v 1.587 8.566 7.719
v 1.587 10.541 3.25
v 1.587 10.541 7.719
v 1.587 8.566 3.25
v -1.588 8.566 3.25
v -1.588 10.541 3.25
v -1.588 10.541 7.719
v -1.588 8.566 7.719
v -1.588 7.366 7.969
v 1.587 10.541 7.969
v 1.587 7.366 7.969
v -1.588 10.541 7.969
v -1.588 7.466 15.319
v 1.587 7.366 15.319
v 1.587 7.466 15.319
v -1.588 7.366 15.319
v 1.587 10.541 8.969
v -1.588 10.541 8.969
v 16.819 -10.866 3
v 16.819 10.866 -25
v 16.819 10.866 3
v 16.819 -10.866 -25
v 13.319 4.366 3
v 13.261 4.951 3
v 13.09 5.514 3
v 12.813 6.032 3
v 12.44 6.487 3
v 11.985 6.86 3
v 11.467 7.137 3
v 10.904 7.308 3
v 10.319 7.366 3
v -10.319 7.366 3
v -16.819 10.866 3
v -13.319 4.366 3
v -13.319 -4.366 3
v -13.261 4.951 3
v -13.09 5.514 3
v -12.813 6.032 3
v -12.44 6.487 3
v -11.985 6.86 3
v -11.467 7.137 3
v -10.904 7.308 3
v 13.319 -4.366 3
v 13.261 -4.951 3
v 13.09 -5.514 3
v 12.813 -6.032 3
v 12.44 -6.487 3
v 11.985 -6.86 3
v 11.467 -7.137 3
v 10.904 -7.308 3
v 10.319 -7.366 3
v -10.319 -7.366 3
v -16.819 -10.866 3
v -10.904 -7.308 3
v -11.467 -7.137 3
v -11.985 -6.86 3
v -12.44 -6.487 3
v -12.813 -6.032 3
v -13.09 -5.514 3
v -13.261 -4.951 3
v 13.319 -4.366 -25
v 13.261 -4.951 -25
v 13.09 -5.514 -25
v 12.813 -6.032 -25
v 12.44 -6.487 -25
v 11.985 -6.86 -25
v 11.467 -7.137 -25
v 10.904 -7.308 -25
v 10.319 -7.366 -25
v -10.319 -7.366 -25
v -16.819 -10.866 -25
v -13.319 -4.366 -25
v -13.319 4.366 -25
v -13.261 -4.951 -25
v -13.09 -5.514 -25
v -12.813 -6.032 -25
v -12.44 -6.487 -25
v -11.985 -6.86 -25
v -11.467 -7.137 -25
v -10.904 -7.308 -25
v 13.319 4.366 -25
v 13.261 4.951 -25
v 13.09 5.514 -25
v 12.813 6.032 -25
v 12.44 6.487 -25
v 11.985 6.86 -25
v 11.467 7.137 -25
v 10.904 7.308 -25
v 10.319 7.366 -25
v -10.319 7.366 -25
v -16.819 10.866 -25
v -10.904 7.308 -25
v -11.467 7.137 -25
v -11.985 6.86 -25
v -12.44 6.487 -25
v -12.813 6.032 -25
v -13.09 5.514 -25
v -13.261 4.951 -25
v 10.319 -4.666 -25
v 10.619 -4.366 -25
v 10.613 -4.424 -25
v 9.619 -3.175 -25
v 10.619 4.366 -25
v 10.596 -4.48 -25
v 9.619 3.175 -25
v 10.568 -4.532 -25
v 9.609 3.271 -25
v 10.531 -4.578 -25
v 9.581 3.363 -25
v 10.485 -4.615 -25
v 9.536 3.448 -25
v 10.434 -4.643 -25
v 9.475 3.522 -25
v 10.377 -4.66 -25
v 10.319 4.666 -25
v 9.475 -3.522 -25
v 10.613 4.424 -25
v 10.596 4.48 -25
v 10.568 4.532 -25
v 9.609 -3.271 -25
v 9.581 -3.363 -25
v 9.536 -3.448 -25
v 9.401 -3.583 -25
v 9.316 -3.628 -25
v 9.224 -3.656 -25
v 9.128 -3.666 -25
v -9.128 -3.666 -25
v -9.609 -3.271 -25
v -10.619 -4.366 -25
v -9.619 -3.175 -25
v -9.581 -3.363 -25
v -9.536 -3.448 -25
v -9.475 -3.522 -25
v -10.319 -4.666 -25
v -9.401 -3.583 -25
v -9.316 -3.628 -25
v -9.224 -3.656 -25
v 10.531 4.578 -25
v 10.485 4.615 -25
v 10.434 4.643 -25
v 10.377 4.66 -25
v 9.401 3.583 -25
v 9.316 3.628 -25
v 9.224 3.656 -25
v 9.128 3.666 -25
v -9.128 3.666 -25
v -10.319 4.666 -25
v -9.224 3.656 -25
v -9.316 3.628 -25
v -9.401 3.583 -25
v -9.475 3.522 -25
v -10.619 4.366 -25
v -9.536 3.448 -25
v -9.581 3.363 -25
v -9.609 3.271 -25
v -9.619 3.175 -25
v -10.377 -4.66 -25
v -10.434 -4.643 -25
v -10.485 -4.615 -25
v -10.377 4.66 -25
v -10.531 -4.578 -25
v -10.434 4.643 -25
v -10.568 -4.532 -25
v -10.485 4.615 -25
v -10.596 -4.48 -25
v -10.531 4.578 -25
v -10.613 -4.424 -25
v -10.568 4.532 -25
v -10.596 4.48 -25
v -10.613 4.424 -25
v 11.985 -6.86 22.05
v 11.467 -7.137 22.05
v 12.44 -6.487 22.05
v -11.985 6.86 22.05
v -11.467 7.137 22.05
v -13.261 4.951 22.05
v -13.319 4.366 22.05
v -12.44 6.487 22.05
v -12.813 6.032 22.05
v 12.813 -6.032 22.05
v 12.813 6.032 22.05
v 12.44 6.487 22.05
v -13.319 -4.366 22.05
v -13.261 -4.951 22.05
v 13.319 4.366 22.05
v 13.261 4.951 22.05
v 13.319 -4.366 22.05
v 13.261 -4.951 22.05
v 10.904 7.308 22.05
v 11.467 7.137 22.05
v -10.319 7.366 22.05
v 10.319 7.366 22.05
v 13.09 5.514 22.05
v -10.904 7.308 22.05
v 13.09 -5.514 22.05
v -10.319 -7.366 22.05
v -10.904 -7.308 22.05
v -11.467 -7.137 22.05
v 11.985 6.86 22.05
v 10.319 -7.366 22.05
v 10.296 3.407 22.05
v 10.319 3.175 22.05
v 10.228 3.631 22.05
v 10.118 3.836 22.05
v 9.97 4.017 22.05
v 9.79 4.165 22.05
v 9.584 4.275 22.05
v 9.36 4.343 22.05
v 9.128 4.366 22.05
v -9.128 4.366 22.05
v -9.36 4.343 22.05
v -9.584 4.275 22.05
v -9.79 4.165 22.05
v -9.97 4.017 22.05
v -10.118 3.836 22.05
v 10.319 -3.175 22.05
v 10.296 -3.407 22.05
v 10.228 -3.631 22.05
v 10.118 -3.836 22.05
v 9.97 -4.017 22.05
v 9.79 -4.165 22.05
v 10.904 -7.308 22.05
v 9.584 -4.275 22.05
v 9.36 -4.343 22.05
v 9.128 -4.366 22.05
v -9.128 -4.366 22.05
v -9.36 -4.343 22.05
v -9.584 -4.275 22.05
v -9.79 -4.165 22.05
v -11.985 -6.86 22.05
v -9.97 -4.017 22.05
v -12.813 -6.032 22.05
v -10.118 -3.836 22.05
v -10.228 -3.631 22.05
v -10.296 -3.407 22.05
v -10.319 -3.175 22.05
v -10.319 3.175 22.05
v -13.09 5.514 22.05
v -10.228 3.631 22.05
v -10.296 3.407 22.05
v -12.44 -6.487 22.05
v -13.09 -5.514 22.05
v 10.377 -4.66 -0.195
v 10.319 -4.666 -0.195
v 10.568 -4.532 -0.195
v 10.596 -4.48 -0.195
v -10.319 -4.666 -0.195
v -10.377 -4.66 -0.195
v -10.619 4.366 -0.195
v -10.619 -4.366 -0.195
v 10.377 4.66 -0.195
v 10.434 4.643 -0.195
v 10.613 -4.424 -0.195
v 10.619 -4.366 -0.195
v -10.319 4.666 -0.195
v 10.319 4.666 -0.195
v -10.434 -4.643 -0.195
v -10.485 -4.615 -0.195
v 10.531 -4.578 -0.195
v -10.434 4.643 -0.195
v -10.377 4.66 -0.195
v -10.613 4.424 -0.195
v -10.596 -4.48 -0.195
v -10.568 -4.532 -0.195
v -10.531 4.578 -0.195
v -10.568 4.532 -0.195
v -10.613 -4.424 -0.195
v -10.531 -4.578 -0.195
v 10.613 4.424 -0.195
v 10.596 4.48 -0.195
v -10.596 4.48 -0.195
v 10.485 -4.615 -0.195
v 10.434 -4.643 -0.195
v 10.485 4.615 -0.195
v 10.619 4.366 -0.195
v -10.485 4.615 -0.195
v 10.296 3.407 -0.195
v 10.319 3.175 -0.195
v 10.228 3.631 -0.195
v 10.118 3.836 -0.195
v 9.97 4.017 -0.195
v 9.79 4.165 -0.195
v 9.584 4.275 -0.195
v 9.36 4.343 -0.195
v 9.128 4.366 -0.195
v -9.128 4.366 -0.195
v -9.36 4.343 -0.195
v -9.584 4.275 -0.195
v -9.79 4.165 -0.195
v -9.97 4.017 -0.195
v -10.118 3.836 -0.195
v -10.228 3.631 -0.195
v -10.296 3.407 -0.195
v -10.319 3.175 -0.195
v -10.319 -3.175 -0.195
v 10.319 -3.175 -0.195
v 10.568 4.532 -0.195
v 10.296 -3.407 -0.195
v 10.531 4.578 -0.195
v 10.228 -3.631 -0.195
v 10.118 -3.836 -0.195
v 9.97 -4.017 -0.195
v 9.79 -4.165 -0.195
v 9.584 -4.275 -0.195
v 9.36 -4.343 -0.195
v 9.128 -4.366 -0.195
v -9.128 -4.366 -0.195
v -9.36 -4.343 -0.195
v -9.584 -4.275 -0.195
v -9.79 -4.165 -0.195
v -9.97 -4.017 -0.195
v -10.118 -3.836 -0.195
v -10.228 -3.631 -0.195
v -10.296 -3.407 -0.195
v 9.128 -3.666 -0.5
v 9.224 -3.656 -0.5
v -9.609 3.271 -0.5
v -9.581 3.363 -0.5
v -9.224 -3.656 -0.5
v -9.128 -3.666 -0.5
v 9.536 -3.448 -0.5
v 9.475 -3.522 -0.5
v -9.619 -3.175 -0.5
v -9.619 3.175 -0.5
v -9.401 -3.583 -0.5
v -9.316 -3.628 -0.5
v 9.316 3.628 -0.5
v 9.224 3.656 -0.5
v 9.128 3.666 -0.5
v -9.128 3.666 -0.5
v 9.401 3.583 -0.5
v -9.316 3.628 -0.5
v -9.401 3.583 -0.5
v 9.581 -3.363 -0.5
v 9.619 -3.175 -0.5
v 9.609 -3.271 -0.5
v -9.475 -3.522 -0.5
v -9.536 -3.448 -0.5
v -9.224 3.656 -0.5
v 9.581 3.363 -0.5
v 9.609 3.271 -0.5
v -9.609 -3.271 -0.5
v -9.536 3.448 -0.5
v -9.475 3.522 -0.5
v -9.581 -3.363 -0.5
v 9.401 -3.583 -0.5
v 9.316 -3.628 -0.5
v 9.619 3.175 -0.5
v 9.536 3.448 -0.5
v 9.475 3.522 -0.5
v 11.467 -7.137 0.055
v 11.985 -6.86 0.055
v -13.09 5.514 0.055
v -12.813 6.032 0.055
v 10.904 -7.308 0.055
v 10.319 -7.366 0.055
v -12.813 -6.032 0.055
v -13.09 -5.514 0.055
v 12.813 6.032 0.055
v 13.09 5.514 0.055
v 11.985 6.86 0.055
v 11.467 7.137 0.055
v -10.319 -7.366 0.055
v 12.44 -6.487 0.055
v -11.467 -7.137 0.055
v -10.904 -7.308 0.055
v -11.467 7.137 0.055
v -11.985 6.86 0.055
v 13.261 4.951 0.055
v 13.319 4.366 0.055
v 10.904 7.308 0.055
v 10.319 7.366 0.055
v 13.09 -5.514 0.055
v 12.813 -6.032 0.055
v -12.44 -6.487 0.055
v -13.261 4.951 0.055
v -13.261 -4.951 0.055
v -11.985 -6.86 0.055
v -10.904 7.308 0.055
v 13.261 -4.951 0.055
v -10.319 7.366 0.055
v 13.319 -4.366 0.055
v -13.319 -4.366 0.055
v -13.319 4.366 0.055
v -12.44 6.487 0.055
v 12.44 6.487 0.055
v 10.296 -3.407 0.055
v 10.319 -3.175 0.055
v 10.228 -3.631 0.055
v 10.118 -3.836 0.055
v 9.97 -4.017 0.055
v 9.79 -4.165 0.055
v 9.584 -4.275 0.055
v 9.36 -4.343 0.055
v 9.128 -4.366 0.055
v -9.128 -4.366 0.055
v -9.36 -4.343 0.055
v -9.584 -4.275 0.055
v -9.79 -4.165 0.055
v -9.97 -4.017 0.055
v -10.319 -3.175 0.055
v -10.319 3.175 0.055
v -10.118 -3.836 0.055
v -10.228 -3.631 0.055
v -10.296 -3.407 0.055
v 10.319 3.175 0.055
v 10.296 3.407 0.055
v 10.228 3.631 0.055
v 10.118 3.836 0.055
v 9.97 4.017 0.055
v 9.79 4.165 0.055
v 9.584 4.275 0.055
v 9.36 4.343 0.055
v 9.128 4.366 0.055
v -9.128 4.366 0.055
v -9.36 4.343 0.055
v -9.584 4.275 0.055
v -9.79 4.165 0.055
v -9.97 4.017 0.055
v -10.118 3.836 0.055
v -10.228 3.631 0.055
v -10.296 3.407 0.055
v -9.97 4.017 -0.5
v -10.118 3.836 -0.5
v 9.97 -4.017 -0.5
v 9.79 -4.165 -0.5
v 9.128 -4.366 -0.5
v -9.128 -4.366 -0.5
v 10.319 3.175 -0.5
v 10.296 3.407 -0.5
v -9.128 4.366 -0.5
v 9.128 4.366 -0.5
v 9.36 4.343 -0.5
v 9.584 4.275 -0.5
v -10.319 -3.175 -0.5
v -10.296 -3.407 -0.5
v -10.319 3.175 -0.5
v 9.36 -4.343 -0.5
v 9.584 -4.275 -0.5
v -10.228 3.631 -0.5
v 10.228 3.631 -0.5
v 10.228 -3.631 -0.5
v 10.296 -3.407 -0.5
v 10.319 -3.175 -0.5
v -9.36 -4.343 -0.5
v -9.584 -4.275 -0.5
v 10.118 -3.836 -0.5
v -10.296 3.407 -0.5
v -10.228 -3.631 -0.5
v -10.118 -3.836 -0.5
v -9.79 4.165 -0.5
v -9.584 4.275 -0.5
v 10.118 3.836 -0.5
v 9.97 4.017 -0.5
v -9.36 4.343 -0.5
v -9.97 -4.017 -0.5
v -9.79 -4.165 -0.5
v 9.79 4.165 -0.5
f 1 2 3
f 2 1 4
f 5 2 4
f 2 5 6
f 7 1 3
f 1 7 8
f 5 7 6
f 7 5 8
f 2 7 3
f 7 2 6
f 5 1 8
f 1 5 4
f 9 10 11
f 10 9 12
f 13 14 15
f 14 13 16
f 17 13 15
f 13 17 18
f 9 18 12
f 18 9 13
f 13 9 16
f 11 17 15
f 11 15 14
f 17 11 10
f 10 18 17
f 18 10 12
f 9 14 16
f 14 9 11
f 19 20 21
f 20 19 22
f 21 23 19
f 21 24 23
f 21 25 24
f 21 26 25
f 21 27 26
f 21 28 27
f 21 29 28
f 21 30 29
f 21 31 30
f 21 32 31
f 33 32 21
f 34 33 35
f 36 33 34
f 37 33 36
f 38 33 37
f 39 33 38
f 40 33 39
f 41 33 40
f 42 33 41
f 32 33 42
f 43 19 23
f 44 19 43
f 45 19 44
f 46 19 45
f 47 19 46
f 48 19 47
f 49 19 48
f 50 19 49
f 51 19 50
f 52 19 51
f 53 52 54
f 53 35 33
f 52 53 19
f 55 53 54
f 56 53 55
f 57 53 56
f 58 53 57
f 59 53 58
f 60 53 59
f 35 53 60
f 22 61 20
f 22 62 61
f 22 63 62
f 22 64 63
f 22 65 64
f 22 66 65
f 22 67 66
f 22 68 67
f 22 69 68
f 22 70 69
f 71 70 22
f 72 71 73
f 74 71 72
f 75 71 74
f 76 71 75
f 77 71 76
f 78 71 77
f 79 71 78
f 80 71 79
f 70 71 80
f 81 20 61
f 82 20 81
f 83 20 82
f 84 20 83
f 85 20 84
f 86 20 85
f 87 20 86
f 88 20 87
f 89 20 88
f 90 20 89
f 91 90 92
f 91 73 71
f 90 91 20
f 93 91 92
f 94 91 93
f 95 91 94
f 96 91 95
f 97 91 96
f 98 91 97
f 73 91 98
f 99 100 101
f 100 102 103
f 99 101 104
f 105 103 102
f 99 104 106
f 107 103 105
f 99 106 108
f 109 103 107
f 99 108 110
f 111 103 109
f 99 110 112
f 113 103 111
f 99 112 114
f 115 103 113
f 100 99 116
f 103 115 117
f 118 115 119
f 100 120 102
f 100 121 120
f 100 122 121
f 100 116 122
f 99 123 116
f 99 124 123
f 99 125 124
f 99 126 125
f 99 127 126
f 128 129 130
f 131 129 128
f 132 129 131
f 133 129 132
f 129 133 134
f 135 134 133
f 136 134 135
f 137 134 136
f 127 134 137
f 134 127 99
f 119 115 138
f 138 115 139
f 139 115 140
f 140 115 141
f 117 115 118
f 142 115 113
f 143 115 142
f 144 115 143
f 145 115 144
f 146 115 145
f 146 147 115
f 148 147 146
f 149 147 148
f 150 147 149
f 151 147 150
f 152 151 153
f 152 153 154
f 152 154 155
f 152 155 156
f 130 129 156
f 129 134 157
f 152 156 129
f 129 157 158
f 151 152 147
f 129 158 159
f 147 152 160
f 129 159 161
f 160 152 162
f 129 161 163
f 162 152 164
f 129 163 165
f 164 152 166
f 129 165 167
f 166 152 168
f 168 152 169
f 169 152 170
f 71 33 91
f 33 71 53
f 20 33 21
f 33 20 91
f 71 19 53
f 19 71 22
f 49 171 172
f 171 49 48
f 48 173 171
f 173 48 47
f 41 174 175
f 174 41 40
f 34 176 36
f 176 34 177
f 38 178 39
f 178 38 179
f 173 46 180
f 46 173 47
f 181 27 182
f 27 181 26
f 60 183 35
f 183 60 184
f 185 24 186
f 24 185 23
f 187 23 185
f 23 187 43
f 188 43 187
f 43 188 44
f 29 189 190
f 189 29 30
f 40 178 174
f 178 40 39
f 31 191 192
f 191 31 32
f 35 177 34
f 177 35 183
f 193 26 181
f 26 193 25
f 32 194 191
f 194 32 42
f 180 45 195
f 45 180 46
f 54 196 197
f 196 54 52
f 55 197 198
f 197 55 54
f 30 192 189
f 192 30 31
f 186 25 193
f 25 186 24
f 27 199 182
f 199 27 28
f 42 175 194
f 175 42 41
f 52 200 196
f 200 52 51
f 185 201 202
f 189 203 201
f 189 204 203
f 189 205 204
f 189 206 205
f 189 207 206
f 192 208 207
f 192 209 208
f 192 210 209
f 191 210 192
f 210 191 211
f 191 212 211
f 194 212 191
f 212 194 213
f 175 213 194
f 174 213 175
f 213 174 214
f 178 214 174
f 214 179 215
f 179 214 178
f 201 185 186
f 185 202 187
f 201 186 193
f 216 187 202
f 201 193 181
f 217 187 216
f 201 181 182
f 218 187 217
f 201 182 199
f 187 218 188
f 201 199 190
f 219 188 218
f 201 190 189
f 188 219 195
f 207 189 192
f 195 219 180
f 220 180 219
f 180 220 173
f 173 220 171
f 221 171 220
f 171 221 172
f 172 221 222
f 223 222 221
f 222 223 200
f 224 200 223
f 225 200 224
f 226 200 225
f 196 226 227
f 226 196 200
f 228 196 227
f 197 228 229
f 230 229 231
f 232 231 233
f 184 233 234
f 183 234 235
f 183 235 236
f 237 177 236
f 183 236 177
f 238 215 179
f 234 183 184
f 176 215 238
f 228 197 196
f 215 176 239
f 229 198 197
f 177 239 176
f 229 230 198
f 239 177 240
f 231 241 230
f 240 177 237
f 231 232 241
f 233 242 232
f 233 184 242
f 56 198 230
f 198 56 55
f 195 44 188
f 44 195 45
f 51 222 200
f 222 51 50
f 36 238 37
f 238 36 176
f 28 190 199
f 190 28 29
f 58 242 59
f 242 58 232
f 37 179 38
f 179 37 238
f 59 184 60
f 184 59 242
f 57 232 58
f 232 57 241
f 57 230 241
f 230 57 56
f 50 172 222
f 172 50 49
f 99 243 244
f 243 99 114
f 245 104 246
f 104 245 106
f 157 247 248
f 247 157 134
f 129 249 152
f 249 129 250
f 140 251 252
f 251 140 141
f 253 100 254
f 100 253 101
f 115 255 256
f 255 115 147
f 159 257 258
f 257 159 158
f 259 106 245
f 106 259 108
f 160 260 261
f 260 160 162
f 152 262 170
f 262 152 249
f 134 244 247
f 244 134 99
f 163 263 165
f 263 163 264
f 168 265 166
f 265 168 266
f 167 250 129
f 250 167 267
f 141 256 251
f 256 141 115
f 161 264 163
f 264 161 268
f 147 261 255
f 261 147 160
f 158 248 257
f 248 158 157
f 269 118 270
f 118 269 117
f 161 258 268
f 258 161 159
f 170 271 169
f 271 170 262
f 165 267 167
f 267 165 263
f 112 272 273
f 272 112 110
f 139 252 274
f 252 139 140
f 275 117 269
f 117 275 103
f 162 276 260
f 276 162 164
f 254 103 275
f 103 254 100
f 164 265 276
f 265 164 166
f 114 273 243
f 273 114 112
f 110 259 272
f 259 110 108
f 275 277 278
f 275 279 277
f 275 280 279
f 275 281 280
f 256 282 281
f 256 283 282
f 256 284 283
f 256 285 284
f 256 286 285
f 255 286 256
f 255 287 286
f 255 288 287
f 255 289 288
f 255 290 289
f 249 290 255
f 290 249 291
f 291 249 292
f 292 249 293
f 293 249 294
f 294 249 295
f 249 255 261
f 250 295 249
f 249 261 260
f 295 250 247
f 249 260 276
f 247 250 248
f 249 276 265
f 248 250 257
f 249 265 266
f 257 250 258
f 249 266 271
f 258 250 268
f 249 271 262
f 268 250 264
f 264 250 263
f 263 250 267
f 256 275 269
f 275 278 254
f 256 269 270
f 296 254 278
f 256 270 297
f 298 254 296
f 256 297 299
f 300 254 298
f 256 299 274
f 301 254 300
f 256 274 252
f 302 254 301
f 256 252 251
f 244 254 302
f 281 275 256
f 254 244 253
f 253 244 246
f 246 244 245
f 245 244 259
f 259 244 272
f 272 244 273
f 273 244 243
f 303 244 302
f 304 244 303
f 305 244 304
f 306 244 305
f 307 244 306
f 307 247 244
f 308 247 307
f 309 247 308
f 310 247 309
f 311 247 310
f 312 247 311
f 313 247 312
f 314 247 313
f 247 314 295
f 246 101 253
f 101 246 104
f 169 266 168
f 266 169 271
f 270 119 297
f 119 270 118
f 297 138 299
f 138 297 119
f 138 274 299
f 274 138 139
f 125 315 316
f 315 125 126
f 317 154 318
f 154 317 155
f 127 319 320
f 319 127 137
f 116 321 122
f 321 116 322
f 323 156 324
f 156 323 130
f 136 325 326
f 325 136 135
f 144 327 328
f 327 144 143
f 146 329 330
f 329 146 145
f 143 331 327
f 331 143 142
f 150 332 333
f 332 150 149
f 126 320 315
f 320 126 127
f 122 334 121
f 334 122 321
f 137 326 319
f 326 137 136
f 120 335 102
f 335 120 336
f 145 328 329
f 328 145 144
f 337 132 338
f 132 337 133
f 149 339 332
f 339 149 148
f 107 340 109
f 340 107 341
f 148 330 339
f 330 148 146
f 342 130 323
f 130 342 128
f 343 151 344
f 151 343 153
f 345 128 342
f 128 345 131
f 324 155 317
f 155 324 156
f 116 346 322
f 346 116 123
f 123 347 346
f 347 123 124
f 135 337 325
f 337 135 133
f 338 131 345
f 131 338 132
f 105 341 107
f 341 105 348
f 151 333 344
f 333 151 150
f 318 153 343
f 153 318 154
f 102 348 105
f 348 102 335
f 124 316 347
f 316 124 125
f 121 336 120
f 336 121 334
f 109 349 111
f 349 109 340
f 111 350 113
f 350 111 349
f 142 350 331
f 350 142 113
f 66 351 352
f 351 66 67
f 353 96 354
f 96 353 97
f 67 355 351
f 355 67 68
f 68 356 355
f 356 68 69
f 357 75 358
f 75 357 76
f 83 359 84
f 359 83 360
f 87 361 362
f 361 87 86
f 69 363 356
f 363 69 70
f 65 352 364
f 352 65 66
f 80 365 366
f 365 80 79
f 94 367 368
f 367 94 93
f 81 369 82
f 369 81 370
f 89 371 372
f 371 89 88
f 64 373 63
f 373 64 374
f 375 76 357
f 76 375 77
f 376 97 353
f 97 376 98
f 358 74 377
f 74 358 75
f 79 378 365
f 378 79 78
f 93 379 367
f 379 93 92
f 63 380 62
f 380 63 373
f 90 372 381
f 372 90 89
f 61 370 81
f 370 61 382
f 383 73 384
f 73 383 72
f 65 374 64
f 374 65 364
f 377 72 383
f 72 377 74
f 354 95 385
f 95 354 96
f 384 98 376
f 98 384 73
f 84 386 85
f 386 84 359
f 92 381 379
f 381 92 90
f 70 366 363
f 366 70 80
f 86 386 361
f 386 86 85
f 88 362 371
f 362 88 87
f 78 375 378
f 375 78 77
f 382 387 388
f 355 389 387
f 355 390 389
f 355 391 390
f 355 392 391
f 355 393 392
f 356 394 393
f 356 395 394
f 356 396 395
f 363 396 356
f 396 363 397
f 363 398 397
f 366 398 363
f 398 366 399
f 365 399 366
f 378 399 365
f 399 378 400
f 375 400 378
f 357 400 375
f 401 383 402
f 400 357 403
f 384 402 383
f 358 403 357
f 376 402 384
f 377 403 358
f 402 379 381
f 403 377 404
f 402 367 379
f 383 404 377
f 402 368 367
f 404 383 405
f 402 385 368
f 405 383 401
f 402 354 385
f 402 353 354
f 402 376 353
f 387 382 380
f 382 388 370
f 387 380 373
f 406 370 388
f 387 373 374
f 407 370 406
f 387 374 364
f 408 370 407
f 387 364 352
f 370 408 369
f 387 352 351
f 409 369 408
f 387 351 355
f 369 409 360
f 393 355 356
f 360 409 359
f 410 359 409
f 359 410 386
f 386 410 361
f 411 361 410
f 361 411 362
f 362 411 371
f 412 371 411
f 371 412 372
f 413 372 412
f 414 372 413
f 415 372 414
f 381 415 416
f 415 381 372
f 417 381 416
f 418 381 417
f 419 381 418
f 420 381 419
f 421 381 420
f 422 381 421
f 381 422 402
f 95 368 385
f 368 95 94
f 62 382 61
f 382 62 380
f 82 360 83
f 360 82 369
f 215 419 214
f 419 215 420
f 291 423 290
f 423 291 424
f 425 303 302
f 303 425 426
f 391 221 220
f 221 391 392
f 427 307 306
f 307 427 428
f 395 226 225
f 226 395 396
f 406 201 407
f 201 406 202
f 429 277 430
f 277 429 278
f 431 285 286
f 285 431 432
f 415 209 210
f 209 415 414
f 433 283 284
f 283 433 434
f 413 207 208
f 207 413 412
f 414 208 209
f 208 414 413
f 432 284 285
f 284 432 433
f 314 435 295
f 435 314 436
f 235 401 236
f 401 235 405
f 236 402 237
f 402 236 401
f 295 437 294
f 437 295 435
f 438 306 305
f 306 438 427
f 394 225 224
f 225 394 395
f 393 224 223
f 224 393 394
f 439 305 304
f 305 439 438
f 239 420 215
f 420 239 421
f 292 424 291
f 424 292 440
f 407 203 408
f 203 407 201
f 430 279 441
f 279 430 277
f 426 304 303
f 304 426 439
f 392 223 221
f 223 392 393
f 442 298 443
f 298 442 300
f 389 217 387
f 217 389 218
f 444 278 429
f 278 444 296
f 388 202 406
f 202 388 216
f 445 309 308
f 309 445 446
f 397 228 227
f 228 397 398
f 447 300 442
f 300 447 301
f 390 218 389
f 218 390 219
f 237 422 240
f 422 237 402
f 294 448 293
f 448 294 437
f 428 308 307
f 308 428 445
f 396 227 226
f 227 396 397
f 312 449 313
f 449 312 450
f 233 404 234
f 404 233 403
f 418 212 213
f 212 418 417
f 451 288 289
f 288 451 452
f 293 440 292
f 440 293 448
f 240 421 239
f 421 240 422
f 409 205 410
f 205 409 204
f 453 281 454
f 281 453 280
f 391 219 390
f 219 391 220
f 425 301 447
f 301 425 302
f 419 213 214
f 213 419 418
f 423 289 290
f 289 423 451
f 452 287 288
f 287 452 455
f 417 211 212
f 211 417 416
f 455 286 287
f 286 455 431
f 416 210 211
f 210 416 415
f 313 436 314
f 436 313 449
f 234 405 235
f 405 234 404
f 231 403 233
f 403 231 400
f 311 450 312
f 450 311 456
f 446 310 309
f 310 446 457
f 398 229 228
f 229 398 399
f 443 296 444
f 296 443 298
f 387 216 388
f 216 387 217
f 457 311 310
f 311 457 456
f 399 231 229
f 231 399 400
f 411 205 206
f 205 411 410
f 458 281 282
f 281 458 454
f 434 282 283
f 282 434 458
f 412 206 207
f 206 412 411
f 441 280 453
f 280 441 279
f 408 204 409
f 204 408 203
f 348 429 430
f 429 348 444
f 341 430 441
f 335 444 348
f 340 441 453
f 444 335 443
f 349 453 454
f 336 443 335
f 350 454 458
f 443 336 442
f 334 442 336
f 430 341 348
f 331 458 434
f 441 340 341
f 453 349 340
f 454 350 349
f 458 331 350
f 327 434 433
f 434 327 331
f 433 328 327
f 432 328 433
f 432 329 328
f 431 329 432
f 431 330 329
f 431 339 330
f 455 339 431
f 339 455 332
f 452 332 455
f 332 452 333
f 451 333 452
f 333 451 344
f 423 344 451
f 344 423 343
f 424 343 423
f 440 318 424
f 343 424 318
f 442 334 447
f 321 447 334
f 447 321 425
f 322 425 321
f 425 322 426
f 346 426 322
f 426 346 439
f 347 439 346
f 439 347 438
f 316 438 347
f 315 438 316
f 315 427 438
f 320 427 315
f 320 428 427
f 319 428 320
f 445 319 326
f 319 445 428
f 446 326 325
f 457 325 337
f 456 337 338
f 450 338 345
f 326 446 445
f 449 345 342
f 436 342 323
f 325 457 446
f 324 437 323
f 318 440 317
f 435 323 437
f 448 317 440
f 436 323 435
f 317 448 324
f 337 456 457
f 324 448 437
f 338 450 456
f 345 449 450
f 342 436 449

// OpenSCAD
gap=0.3;
function fusex() = 13/16*25.4;
function fusey() = 11/32*25.4;
function fusewall() = 3;
module fuse(d=3,s=1,e=0,er=0) {
    x=fusex();
    y=fusey();
    z=3/4*25.4;
    tx=1/8*25.4;
    tz=1;
    ty=1/8*25.4;
    tsz=2*ty;
    th=(11/32)*25.4-2;
    r=3/64*25.4;
    w=fusewall();
    $fn=32;
    translate([-x/2,-y/2,z+d])
    mirror([0,0,1])
    if (s==2) {
        translate([x/2-tx/2,y+w,th]) translate([0,1.2,tsz+tz+.25]) cube([tx,ty-1.2,z-th-tsz-tz-0.5]);
        translate([x/2-tx/2,y+w,th]) hull() {
            translate([0,0,tsz]) cube([tx,ty,tz]);
            cube([tx,0.1,.1]);
        }
    } else if (s==1) {
        linear_extrude(z+d) offset(r=w) square([x,y]);
    } else {
        translate([0,0,-0.5]) linear_extrude(z+d+1) offset(r=r) offset(r=-r) square([x,y]);
        if (e>0) {
            difference() {
                translate([0,0,e-d-0.005]) linear_extrude(e+d+0.56) offset(r=er) square([x,y]);
                if (er>=1) {
                    difference() {
                        translate([0,0,0.25+e-d-0.005]) linear_extrude(e+d+0.56-.25) offset(r=.3) square([x,y]);
                        translate([0,0,e-d-0.005]) linear_extrude(e+d+0.56+.25) offset(r=r-.7) offset(r=-r) square([x,y]);
                    }
                }
            }
        }
    }
}

module test() {
    difference() {
        union() {
            translate([0,0,-14+3]) cube([fusex()+fusewall()+10,fusey()+fusewall()+10,25+3],true);
            fuse(3,1);
            fuse(3,2);
        }
        fuse(3,0,25,3);
    }
}
test();
